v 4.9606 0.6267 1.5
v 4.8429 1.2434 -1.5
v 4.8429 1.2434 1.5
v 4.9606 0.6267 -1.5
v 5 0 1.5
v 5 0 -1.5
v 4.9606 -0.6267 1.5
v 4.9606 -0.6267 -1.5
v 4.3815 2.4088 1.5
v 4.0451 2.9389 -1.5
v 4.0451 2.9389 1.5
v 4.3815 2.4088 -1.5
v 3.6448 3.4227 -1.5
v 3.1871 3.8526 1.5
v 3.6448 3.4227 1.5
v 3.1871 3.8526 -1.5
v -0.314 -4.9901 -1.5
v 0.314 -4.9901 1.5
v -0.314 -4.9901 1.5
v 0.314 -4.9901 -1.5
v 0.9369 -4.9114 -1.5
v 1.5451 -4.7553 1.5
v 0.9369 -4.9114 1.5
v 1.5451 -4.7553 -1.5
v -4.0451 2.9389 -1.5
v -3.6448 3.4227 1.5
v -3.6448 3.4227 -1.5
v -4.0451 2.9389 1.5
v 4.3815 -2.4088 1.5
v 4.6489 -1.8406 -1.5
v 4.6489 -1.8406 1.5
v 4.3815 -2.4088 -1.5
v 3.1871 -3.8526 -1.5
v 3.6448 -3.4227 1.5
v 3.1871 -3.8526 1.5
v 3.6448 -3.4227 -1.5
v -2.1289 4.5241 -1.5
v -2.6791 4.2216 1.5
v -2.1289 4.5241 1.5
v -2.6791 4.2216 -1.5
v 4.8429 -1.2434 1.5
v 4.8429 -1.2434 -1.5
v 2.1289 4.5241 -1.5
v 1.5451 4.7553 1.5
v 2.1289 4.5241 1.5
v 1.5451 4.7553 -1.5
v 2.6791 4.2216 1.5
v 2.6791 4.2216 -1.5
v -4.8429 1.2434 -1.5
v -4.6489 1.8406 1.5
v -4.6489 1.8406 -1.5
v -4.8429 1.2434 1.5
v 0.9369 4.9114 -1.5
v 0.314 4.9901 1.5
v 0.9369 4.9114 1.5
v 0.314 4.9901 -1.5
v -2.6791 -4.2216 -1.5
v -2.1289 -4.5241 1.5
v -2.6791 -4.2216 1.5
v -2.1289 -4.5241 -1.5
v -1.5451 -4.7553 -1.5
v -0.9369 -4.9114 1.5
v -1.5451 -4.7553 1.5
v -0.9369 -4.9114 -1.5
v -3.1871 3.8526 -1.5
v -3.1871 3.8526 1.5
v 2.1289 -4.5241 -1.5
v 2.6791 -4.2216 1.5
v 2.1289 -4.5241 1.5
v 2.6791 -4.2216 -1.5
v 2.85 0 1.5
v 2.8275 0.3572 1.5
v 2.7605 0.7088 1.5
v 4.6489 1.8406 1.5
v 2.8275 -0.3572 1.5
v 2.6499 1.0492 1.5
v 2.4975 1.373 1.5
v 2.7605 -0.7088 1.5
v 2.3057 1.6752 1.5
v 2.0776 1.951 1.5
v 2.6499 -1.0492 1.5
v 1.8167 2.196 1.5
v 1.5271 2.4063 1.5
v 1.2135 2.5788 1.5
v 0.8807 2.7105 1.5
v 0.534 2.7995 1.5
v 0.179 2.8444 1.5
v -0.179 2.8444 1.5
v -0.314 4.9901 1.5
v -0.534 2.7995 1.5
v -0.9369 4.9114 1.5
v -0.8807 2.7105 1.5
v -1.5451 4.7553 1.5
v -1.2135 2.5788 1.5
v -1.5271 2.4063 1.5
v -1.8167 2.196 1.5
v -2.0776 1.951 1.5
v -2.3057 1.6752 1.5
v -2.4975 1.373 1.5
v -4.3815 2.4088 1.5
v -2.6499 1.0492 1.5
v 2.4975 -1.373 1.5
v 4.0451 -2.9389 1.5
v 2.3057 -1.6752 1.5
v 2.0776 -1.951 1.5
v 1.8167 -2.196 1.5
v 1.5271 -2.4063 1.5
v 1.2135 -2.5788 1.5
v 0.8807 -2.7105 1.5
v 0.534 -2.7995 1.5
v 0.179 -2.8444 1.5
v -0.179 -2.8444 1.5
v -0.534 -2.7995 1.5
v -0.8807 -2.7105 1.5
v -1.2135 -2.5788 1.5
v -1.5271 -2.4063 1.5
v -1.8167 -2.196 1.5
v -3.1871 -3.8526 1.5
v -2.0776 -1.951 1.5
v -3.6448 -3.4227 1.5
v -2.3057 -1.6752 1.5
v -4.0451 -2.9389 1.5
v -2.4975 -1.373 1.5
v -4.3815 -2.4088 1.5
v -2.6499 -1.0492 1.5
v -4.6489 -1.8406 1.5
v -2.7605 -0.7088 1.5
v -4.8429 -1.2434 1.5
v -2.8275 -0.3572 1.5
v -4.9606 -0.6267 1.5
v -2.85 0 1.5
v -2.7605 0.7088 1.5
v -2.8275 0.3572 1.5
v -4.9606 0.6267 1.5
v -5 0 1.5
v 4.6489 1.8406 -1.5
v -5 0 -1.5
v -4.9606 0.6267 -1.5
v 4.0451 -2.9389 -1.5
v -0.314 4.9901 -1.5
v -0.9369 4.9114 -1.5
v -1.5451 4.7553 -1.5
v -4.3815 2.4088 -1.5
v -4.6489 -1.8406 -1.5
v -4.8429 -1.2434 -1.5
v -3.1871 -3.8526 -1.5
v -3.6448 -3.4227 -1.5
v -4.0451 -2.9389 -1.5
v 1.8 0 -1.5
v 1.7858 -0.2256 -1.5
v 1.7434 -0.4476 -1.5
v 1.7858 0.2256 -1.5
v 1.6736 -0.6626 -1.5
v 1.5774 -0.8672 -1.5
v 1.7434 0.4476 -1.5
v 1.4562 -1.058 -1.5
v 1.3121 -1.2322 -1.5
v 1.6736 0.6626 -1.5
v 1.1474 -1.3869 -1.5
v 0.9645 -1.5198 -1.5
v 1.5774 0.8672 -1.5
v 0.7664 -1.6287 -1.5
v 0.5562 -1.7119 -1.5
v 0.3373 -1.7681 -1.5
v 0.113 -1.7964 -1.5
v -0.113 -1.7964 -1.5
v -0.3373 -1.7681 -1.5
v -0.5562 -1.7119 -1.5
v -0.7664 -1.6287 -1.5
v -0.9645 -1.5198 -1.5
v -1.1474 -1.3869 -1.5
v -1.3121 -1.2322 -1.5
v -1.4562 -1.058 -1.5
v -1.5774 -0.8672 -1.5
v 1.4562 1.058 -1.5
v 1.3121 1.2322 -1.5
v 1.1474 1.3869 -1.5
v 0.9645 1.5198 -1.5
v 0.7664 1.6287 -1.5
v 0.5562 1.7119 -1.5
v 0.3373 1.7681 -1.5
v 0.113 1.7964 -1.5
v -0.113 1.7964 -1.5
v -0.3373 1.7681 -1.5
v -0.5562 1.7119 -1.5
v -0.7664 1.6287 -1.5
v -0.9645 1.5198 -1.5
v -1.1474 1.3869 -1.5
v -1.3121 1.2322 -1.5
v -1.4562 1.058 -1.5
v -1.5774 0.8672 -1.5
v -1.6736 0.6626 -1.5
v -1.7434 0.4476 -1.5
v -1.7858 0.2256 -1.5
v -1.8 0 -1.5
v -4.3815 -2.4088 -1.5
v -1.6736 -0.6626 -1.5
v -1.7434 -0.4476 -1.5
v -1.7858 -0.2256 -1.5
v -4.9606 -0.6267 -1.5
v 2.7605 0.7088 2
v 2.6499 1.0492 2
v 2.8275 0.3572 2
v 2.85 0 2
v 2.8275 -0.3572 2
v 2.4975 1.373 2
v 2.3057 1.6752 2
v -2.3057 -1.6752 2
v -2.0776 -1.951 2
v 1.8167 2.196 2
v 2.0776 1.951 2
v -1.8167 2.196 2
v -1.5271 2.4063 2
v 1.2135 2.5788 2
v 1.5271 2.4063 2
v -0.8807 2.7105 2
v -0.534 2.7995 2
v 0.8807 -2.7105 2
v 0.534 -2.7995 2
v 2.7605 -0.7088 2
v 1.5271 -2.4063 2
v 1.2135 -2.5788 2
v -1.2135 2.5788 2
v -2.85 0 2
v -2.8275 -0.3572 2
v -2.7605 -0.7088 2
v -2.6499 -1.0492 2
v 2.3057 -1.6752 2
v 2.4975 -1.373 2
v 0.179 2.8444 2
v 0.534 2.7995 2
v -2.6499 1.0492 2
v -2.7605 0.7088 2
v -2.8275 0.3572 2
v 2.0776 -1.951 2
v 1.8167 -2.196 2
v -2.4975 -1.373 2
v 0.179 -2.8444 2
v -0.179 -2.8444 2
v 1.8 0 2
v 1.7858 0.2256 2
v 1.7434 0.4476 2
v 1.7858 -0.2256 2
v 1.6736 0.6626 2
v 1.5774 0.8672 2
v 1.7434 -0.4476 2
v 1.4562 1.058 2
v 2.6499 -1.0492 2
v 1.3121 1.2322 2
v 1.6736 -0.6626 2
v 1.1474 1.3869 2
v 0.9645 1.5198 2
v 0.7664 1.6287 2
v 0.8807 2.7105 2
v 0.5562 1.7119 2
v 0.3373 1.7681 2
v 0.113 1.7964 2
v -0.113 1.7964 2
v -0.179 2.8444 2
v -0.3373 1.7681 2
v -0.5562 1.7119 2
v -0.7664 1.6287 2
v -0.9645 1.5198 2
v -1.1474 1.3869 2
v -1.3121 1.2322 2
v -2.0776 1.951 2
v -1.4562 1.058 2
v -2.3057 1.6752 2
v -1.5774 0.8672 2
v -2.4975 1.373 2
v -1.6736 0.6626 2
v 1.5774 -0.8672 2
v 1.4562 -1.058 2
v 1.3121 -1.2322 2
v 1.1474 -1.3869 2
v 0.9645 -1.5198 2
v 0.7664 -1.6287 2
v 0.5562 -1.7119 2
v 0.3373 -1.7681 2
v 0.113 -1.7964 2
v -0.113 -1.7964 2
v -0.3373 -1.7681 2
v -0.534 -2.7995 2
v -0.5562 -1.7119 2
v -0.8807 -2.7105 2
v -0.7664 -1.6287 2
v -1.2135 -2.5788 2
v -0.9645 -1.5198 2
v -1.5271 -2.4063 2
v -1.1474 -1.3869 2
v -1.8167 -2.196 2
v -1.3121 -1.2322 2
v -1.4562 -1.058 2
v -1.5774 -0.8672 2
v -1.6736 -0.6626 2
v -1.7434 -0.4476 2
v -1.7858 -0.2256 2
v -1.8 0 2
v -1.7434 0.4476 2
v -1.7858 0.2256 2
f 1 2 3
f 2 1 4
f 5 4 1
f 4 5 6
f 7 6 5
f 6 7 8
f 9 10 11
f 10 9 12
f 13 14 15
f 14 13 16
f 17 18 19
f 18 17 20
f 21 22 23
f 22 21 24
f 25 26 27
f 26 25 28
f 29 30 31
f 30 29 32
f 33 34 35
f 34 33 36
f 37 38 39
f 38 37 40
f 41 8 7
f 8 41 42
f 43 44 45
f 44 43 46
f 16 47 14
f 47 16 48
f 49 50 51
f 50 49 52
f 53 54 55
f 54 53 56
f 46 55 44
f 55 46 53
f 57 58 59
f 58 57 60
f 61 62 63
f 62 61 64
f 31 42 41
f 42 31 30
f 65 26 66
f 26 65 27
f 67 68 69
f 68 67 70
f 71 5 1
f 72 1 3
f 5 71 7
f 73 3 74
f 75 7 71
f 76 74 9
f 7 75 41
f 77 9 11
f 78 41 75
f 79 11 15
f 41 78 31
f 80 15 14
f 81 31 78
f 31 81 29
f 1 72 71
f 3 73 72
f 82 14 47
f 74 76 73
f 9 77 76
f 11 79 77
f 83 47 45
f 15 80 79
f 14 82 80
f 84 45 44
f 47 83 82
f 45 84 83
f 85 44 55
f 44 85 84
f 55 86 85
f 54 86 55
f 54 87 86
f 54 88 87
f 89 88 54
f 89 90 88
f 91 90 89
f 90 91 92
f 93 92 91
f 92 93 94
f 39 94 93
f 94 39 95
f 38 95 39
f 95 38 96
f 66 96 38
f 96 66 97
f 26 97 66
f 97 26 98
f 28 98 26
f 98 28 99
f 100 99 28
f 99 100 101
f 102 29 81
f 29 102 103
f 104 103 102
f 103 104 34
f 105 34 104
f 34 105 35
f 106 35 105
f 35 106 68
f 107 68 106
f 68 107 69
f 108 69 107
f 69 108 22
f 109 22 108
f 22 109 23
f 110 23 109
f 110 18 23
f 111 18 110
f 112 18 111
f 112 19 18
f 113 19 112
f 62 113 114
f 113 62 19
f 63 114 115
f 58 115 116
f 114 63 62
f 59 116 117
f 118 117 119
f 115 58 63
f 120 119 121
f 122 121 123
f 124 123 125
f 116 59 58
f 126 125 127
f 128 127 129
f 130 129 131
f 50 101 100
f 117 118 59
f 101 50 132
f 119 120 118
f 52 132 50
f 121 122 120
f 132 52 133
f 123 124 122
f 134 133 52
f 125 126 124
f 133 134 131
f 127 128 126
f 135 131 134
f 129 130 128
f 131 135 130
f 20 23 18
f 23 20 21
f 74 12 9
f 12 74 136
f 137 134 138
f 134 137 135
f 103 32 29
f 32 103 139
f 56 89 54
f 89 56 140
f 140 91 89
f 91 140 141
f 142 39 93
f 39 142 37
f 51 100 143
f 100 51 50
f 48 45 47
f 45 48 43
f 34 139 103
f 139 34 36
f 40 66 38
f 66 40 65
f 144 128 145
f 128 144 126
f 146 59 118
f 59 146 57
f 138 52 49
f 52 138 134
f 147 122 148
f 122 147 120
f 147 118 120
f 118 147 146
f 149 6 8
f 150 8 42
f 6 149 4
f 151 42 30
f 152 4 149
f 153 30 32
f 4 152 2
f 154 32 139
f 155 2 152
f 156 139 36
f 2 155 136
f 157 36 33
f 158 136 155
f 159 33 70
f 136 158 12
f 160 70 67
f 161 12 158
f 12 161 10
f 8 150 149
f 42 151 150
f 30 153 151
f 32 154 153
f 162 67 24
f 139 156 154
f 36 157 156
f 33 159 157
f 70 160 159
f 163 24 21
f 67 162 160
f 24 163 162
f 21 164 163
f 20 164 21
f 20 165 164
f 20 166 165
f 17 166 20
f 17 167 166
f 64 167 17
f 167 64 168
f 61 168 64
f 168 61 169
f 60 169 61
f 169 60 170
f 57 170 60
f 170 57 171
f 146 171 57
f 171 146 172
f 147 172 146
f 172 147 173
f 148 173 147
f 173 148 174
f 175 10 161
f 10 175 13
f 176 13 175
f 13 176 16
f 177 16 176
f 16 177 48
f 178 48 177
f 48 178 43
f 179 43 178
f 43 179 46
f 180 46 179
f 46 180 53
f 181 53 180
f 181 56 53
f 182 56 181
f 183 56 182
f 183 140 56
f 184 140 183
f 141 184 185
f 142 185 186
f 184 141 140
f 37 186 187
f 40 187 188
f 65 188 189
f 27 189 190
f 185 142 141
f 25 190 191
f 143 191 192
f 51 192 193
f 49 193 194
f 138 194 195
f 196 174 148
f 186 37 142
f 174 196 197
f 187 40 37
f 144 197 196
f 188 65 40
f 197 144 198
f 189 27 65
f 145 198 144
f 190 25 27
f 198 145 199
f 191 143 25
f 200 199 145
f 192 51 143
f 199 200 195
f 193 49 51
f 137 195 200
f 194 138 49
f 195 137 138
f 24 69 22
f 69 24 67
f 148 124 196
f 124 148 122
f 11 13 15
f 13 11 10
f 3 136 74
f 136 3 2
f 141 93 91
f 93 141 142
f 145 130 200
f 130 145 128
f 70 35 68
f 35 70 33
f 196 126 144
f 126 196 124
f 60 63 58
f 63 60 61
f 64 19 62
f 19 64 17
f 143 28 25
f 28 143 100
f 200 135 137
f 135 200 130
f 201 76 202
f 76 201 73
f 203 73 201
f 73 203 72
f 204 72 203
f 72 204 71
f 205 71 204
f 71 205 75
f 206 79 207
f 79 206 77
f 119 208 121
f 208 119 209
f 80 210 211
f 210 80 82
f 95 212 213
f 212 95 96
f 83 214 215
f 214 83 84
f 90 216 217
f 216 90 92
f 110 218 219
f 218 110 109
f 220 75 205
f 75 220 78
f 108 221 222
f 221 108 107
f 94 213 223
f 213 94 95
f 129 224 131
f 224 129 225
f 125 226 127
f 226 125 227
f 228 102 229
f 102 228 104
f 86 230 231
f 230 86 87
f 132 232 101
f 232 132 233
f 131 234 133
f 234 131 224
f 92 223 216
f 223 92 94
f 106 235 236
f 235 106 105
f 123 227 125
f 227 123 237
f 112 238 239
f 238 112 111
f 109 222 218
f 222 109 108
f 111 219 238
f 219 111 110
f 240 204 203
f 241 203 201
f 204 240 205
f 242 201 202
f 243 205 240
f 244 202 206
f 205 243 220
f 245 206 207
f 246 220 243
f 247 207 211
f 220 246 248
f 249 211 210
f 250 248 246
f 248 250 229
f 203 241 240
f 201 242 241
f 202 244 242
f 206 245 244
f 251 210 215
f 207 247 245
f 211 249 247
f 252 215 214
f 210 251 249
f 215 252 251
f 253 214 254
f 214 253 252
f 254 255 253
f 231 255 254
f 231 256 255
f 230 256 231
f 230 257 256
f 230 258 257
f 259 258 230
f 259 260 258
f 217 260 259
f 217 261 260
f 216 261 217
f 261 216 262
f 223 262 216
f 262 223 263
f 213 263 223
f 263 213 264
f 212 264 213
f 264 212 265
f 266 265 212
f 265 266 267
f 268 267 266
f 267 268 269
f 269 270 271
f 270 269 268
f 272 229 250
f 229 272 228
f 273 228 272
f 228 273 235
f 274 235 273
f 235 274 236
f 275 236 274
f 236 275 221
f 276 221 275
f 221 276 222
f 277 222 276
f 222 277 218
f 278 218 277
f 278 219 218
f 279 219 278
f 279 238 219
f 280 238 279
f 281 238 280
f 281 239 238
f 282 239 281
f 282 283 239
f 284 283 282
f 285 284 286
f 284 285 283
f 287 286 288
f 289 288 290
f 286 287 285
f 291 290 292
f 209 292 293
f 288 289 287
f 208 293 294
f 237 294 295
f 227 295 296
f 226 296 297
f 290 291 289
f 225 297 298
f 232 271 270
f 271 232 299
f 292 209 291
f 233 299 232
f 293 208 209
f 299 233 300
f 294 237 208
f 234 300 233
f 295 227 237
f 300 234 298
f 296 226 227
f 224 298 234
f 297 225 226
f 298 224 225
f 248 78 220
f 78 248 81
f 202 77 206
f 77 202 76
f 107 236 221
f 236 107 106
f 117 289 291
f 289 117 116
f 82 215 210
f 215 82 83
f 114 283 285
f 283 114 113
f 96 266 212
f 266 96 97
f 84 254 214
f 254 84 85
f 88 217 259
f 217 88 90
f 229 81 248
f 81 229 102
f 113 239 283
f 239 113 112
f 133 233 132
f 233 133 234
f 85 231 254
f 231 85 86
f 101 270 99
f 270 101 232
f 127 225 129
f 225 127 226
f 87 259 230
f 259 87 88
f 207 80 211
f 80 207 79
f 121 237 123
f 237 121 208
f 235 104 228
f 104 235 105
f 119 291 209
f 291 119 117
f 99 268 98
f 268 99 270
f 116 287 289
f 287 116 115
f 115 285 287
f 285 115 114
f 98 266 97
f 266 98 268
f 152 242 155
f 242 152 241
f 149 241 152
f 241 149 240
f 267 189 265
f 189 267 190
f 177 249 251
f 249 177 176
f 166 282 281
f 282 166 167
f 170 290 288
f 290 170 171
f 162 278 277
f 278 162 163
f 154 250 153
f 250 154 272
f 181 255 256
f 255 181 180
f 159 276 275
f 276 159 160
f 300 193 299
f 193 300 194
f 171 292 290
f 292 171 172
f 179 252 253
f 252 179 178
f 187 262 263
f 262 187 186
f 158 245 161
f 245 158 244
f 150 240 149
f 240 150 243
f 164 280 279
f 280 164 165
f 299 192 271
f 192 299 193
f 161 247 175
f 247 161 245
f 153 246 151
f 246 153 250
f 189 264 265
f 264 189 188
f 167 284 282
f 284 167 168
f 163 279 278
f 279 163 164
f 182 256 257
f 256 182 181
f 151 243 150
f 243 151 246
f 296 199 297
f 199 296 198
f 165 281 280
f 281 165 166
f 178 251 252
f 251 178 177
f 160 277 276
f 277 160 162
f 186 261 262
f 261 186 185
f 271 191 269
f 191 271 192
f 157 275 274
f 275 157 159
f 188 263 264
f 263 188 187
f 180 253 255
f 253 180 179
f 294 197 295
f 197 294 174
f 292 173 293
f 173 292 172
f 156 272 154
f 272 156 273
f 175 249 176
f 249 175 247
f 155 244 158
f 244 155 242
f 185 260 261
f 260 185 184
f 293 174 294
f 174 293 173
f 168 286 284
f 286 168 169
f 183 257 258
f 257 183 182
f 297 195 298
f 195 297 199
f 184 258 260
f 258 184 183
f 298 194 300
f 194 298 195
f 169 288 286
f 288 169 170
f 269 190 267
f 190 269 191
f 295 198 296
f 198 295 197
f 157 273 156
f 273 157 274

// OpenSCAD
$fn = 50;


difference() {
	union() {
		translate(v = [0, 0, -1.5000000000]) {
			cylinder(h = 3, r = 5.0000000000);
		}
		translate(v = [0, 0, -1.5000000000]) {
			cylinder(h = 3.5000000000, r = 2.8500000000);
		}
	}
	union() {
		translate(v = [0, 0, -50.0000000000]) {
			cylinder(h = 100, r = 1.8000000000);
		}
	}
}
